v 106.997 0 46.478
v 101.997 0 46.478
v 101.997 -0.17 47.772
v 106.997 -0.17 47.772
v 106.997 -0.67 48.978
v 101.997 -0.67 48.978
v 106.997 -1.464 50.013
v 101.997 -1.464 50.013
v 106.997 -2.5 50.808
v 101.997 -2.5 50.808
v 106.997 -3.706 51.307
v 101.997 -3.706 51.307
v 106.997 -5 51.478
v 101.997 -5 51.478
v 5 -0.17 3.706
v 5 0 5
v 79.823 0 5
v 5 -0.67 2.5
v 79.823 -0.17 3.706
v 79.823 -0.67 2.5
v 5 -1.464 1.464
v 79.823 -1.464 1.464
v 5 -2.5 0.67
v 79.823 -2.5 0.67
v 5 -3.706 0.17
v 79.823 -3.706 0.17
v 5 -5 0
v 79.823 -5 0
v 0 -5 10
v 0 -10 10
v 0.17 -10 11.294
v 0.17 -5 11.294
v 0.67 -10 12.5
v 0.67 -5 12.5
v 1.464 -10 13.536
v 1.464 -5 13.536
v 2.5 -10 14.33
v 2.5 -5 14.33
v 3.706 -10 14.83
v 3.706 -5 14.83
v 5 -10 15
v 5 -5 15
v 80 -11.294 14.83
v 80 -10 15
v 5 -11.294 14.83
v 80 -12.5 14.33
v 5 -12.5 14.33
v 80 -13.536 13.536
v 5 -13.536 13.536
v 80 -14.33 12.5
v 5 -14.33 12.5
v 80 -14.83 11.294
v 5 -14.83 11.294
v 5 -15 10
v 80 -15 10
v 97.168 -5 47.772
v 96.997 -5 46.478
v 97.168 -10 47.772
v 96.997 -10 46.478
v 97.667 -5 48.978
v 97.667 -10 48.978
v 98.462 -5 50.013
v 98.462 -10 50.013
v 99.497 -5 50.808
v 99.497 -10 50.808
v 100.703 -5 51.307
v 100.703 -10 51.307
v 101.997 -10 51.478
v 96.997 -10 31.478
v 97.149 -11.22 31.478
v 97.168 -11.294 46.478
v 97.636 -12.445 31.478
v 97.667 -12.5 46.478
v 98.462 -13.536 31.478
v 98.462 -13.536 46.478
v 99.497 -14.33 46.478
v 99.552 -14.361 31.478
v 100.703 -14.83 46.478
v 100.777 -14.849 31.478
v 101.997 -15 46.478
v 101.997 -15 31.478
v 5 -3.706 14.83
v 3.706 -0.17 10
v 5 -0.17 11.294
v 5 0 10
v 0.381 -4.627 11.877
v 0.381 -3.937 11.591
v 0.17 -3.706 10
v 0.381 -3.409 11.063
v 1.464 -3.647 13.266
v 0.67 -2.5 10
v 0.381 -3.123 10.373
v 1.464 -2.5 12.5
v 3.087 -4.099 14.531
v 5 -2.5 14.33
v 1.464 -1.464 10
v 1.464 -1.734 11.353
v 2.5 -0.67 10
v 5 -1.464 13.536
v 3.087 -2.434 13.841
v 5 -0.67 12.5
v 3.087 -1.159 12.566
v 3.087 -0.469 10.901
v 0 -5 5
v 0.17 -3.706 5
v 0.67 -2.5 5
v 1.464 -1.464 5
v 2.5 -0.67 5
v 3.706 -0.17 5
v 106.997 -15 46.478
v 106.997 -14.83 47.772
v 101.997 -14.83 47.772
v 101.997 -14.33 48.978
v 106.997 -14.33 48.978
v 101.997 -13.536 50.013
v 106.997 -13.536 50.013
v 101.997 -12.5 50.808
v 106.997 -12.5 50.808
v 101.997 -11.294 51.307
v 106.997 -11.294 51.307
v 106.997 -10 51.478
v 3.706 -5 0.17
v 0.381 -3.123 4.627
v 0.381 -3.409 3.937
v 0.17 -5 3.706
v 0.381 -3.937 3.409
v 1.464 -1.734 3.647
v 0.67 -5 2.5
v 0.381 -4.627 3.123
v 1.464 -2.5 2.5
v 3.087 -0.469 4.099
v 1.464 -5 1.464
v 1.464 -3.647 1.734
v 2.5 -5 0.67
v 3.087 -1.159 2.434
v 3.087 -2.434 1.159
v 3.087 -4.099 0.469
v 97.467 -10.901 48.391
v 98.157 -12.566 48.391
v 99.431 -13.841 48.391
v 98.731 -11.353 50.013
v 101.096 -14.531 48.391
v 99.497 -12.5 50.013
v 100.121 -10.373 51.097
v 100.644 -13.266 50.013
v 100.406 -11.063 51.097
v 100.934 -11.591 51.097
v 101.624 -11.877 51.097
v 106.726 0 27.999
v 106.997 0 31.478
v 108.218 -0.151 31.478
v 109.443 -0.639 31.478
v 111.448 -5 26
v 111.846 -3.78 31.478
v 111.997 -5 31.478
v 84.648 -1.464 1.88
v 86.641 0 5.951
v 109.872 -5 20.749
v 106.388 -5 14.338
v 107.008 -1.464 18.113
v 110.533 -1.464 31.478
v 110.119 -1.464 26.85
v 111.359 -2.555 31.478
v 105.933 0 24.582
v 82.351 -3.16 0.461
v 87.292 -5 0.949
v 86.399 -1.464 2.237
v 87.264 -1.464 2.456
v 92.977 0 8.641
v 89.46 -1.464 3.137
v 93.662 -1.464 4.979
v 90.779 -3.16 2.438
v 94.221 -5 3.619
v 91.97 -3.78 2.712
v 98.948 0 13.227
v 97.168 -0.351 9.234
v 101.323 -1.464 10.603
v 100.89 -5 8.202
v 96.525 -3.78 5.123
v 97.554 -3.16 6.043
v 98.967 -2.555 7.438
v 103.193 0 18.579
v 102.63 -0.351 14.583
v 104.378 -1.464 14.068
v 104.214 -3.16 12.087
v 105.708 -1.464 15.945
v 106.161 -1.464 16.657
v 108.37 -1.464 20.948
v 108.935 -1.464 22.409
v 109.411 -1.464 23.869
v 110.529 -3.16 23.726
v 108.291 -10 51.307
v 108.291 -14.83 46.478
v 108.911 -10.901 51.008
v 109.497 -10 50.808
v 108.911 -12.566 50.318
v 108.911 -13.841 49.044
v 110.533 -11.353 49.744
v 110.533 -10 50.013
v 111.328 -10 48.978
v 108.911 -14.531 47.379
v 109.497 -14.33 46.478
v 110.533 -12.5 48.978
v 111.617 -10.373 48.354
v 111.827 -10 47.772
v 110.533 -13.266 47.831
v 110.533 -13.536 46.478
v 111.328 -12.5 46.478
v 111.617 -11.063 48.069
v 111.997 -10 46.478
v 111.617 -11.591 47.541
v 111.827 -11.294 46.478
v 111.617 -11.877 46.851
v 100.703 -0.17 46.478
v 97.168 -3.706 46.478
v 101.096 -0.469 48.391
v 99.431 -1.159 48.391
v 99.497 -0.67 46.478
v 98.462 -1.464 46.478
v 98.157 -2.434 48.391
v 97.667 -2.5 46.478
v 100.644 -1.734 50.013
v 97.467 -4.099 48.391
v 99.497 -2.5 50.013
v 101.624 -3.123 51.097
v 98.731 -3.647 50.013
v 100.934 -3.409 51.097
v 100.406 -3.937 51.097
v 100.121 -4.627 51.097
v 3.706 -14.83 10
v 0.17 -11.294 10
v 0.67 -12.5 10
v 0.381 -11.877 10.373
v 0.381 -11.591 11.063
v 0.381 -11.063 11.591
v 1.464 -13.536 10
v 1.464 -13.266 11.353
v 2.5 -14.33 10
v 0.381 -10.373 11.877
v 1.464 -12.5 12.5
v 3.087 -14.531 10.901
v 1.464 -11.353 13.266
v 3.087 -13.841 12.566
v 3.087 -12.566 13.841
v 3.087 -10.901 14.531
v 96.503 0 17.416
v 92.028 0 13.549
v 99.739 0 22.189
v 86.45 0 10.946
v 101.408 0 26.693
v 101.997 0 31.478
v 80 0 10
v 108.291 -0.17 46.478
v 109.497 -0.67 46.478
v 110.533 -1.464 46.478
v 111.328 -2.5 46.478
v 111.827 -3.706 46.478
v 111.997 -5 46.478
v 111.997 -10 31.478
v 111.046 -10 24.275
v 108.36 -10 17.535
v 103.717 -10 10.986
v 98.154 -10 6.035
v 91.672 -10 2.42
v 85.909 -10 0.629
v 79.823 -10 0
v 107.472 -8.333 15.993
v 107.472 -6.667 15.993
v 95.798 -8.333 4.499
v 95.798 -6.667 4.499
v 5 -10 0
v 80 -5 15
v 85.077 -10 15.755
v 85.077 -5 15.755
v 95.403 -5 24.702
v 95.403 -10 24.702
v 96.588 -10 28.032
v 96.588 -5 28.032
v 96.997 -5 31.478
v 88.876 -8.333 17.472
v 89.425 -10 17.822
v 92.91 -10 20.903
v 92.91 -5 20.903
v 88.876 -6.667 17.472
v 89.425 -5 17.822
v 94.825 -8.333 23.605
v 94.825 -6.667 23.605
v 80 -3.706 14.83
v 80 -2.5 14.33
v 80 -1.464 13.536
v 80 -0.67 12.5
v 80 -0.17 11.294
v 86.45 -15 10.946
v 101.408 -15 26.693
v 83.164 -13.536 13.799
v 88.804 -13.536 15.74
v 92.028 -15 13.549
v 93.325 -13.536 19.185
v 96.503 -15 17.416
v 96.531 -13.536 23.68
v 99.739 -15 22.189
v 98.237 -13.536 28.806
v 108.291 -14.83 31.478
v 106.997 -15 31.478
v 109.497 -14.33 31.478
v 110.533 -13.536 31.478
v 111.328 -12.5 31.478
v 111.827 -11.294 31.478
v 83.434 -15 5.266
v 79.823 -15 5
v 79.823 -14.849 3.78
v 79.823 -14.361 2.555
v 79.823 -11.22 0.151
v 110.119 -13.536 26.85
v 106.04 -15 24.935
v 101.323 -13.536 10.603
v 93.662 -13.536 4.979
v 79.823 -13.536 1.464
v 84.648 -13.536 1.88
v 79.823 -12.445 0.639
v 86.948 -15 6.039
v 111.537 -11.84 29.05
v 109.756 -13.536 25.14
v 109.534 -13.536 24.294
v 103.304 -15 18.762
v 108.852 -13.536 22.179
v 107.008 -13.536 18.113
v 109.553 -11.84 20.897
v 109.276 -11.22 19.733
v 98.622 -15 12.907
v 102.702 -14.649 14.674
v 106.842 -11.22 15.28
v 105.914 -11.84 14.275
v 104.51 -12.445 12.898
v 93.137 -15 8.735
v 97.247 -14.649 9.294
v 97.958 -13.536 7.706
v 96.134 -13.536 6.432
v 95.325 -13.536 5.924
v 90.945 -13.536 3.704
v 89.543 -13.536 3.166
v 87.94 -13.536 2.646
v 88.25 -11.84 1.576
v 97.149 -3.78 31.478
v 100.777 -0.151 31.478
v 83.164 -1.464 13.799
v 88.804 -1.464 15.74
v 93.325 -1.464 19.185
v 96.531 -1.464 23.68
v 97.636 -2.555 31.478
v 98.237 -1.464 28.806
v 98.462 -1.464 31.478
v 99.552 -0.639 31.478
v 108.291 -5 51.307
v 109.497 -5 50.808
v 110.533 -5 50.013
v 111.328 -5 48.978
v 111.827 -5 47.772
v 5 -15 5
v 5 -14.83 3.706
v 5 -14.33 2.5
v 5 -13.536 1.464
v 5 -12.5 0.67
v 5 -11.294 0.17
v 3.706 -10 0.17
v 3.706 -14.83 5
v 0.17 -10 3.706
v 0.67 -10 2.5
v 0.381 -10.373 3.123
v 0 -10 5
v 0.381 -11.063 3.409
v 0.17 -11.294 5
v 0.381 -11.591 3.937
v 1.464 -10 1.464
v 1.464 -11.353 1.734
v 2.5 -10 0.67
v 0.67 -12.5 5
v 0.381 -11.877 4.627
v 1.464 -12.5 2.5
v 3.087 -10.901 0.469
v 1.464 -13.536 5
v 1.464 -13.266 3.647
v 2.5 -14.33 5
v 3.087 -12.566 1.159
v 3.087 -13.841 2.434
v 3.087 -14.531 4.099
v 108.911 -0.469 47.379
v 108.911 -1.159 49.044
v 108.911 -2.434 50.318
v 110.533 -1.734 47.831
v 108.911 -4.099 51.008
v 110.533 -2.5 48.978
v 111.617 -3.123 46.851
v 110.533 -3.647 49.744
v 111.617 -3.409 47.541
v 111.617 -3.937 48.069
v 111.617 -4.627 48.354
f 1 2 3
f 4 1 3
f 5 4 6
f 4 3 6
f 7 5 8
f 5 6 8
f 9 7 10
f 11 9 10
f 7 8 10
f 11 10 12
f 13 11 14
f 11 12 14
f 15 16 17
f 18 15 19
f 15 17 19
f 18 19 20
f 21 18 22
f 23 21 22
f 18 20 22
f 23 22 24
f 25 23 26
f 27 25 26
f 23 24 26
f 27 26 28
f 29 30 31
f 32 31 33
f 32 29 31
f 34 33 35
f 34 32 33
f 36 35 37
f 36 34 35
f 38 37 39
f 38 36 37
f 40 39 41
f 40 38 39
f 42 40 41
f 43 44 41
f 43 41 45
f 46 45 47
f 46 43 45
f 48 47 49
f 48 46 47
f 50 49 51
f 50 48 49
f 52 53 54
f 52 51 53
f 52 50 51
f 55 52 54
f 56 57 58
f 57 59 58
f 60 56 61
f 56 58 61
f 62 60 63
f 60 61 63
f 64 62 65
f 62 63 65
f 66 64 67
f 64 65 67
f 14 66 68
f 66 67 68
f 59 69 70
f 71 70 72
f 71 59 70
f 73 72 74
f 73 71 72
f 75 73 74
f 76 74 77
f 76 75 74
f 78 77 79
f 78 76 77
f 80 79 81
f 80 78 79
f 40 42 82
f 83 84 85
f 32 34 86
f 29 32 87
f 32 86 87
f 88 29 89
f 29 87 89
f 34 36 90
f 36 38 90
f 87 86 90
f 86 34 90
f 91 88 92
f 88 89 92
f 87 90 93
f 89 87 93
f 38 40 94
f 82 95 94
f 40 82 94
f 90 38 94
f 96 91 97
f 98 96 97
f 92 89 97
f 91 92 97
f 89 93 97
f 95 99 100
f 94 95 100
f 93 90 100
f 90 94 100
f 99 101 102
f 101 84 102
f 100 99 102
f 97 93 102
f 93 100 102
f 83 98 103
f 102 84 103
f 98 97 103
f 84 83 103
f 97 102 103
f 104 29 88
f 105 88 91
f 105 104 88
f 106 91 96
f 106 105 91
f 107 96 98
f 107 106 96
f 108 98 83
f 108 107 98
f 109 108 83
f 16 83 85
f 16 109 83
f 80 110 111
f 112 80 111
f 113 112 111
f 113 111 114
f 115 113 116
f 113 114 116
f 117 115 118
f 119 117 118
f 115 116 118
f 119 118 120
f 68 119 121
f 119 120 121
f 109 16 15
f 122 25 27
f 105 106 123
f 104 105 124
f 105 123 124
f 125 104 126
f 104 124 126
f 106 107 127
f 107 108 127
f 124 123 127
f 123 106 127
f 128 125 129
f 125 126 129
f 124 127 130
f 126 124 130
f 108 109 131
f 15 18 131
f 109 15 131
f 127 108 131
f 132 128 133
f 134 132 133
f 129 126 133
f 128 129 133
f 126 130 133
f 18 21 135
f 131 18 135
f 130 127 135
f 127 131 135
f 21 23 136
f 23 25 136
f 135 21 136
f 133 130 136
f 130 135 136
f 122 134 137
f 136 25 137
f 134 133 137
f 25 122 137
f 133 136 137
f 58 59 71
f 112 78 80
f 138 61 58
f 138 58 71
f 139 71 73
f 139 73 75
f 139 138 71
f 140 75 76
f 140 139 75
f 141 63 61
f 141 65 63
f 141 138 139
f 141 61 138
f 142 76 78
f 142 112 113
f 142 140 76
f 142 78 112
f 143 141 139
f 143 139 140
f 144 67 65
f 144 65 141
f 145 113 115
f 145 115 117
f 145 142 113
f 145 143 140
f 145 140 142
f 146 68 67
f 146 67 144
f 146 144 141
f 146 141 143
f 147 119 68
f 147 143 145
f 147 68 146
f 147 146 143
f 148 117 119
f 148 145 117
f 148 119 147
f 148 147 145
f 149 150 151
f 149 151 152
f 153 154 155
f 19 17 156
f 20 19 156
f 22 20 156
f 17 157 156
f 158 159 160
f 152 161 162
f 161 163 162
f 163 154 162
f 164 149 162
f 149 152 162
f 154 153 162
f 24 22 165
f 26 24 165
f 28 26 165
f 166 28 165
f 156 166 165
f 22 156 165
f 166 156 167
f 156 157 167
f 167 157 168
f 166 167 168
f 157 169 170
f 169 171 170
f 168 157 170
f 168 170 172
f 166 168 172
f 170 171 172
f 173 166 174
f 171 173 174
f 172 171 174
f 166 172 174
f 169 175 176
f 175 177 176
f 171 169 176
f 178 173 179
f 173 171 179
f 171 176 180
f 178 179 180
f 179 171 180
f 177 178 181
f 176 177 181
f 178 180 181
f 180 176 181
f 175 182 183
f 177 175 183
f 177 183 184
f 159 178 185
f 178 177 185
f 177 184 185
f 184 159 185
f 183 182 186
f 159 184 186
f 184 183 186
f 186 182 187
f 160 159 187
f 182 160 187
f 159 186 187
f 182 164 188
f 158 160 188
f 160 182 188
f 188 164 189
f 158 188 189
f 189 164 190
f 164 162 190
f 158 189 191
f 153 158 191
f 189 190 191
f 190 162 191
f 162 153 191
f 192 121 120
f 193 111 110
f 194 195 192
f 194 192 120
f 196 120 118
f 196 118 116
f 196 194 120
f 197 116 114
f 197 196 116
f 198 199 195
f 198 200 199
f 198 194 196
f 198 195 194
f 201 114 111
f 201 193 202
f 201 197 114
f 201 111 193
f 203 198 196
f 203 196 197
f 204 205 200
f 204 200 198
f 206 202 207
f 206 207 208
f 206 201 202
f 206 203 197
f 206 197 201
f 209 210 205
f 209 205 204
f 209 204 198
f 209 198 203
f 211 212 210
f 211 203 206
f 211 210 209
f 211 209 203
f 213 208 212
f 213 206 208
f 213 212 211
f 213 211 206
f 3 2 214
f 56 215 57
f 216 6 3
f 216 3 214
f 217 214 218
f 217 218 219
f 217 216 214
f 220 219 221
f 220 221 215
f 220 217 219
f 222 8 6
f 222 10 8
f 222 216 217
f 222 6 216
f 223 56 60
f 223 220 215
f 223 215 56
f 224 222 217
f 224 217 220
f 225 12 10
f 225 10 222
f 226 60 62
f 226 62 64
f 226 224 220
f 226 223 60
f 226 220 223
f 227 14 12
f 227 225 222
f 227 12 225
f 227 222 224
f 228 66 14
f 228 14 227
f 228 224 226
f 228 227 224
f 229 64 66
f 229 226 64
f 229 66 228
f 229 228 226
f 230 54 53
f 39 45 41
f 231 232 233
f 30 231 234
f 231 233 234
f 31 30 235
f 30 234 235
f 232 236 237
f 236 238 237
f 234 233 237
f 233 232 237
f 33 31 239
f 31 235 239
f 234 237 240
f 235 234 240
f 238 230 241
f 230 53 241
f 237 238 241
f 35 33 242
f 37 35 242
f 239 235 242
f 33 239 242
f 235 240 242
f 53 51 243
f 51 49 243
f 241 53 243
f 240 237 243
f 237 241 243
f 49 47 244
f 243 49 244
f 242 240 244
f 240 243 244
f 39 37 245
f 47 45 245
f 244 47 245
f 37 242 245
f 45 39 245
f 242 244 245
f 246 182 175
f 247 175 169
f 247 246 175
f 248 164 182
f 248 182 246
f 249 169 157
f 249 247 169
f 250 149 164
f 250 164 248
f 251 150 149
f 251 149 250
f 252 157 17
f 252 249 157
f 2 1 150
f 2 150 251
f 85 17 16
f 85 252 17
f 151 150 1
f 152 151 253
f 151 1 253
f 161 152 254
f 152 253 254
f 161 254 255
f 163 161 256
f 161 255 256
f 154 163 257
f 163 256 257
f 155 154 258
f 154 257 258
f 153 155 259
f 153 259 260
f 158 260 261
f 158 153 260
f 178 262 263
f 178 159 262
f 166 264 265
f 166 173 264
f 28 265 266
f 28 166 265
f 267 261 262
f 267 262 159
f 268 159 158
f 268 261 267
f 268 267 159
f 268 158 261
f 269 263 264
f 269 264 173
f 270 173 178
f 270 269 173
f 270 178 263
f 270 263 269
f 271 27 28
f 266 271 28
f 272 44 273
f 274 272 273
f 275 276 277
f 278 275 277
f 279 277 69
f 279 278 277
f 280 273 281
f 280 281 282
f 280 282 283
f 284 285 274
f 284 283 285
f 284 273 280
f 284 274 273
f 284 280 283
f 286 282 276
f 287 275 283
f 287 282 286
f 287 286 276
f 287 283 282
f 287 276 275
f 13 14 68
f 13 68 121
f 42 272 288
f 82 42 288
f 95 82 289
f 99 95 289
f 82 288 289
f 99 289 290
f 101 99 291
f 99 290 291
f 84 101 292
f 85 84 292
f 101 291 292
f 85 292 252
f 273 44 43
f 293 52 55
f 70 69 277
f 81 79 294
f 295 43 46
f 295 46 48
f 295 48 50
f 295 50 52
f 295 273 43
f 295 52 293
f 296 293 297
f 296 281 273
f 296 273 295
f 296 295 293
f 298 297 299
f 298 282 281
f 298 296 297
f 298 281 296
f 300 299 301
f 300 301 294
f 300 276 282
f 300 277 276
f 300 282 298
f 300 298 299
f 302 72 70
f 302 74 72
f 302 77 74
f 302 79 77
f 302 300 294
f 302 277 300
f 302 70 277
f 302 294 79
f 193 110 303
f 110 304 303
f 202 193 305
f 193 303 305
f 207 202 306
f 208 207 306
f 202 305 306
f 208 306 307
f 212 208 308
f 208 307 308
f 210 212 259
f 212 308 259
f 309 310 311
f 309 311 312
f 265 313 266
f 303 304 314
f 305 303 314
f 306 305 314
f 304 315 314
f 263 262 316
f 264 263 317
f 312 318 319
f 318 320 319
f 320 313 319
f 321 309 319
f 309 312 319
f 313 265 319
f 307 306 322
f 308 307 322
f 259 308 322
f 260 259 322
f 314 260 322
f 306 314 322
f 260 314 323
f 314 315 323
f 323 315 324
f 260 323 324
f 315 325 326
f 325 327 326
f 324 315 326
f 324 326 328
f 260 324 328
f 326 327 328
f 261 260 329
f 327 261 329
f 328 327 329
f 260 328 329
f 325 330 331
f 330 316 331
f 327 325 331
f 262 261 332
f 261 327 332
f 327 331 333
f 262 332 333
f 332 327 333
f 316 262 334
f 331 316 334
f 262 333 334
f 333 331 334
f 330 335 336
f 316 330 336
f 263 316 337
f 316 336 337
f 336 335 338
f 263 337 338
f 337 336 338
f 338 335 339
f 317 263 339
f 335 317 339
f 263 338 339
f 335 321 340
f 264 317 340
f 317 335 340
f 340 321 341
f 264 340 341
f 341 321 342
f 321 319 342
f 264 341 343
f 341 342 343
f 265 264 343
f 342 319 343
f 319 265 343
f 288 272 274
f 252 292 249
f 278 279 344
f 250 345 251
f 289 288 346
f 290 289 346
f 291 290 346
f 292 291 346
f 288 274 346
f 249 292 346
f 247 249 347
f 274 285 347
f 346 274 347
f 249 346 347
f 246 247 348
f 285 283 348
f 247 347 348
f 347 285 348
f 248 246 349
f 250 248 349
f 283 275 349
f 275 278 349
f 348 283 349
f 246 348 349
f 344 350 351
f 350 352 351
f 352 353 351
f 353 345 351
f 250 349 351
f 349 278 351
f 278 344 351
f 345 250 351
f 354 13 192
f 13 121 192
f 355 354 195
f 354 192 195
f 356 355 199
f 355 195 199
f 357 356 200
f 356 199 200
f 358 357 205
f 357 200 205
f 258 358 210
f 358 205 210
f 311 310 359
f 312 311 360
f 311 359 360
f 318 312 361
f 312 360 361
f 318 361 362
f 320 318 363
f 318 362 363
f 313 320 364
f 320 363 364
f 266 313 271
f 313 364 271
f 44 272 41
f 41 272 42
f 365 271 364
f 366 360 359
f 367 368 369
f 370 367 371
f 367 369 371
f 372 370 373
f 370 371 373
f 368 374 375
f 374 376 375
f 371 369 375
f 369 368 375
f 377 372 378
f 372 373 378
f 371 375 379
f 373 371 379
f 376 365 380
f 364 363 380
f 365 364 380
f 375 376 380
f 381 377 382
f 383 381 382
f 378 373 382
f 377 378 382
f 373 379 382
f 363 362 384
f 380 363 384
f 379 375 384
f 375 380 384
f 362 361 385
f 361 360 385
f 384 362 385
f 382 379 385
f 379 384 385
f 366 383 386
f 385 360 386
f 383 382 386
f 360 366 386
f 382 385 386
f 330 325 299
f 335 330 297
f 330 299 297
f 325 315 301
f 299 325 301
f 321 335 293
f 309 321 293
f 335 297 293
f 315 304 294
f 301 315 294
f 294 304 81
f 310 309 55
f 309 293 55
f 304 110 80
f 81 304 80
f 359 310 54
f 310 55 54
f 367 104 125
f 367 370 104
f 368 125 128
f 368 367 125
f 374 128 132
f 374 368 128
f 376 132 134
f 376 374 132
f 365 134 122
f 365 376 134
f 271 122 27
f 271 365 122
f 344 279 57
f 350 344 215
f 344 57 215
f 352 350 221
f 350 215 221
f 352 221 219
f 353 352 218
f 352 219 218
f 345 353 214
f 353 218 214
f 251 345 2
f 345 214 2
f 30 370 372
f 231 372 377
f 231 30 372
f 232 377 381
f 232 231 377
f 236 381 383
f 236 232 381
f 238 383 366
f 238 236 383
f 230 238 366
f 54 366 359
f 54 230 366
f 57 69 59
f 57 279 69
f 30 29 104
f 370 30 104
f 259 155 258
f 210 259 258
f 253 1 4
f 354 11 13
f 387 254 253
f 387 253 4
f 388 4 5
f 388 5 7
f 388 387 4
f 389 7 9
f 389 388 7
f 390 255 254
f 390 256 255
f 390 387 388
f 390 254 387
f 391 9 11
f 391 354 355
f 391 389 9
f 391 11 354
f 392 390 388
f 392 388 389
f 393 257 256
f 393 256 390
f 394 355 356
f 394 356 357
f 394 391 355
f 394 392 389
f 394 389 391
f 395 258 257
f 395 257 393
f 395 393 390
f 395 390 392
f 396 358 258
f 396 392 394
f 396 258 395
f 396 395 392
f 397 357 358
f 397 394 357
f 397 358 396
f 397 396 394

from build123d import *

# Parameters (mm, degrees)
F0_W     = 15
F0_H     = 20
F1_DEPTH = 15
F2_F1_R  = 5
F2_F2_R  = 5
F2_F3_R  = 5
F2_F4_R  = 5
F2_F5_R  = 5


# Not quite as in the source:
# - a feature of the source that left no trace in its solid (it failed there, or was rolled back) is left out
# - a feature names something its author has since deleted; it is built from what else it names


with BuildPart() as f1:
    # F0 (on Front) → F1 (new body)
    with BuildSketch(Plane.XZ):
        with BuildLine():
            add(Edge.make_bspline(
                [(80, 15), (90.0562568152, 15), (96.9973913685, 23.3758884073), (96.9973913685, 31.4775960116)],
                knots=[0, 0, 0, 0, 23.6732440459, 23.6732440459, 23.6732440459, 23.6732440459], degree=3))
            Line((80, 15), (79.8229584098, 0))
            add(Edge.make_bspline(
                [(111.9973913685, 31.4775960116), (111.9973913685, 15), (96.9973913685, 0), (79.8229584098, 0)],
                knots=[0, 0, 0, 0, 45.0114783904, 45.0114783904, 45.0114783904, 45.0114783904], degree=3))
            Line((111.9973913685, 31.4775960116), (96.9973913685, 31.4775960116))
        make_face()
        with Locations((104.4973913685, 41.4775960116)):
            Rectangle(F0_W, F0_H)
        Polygon((80, 15), (0, 15), (0, 0), (79.8229584098, 0), align=None)
    extrude(amount=F1_DEPTH)

    # F2: fillet of radius 5 on 20 edges, made by hand

    # F2_f1
    f2_f1_edges = [f1.edges().sort_by_distance(p)[0] for p in [
        (92.2697919899, 0, 20.2006576542),
        (96.9973913685, 0, 41.4775960116),
        (40, 0, 15),
    ]]
    fillet(f2_f1_edges, radius=F2_F1_R)

    # F2_f2
    f2_f2_edges = [f1.edges().sort_by_distance(p)[0] for p in [
        (92.2697919899, -15, 20.2006576542),
        (96.9973913685, -15, 41.4775960116),
        (40, -15, 15),
    ]]
    fillet(f2_f2_edges, radius=F2_F2_R)

    # F2_f3
    f2_f3_edges = [f1.edges().sort_by_distance(p)[0] for p in [
        (96.9973913685, -7.5, 51.4775960116),
    ]]
    fillet(f2_f3_edges, radius=F2_F3_R)

    # F2_f4
    f2_f4_edges = [f1.edges().sort_by_distance(p)[0] for p in [
        (111.9973913685, -7.5, 51.4775960116),
    ]]
    fillet(f2_f4_edges, radius=F2_F4_R)

    # F2_f5
    f2_f5_edges = [f1.edges().sort_by_distance(p)[0] for p in [
        (0, -7.5, 0),
    ]]
    fillet(f2_f5_edges, radius=F2_F5_R)


solid = f1.part
